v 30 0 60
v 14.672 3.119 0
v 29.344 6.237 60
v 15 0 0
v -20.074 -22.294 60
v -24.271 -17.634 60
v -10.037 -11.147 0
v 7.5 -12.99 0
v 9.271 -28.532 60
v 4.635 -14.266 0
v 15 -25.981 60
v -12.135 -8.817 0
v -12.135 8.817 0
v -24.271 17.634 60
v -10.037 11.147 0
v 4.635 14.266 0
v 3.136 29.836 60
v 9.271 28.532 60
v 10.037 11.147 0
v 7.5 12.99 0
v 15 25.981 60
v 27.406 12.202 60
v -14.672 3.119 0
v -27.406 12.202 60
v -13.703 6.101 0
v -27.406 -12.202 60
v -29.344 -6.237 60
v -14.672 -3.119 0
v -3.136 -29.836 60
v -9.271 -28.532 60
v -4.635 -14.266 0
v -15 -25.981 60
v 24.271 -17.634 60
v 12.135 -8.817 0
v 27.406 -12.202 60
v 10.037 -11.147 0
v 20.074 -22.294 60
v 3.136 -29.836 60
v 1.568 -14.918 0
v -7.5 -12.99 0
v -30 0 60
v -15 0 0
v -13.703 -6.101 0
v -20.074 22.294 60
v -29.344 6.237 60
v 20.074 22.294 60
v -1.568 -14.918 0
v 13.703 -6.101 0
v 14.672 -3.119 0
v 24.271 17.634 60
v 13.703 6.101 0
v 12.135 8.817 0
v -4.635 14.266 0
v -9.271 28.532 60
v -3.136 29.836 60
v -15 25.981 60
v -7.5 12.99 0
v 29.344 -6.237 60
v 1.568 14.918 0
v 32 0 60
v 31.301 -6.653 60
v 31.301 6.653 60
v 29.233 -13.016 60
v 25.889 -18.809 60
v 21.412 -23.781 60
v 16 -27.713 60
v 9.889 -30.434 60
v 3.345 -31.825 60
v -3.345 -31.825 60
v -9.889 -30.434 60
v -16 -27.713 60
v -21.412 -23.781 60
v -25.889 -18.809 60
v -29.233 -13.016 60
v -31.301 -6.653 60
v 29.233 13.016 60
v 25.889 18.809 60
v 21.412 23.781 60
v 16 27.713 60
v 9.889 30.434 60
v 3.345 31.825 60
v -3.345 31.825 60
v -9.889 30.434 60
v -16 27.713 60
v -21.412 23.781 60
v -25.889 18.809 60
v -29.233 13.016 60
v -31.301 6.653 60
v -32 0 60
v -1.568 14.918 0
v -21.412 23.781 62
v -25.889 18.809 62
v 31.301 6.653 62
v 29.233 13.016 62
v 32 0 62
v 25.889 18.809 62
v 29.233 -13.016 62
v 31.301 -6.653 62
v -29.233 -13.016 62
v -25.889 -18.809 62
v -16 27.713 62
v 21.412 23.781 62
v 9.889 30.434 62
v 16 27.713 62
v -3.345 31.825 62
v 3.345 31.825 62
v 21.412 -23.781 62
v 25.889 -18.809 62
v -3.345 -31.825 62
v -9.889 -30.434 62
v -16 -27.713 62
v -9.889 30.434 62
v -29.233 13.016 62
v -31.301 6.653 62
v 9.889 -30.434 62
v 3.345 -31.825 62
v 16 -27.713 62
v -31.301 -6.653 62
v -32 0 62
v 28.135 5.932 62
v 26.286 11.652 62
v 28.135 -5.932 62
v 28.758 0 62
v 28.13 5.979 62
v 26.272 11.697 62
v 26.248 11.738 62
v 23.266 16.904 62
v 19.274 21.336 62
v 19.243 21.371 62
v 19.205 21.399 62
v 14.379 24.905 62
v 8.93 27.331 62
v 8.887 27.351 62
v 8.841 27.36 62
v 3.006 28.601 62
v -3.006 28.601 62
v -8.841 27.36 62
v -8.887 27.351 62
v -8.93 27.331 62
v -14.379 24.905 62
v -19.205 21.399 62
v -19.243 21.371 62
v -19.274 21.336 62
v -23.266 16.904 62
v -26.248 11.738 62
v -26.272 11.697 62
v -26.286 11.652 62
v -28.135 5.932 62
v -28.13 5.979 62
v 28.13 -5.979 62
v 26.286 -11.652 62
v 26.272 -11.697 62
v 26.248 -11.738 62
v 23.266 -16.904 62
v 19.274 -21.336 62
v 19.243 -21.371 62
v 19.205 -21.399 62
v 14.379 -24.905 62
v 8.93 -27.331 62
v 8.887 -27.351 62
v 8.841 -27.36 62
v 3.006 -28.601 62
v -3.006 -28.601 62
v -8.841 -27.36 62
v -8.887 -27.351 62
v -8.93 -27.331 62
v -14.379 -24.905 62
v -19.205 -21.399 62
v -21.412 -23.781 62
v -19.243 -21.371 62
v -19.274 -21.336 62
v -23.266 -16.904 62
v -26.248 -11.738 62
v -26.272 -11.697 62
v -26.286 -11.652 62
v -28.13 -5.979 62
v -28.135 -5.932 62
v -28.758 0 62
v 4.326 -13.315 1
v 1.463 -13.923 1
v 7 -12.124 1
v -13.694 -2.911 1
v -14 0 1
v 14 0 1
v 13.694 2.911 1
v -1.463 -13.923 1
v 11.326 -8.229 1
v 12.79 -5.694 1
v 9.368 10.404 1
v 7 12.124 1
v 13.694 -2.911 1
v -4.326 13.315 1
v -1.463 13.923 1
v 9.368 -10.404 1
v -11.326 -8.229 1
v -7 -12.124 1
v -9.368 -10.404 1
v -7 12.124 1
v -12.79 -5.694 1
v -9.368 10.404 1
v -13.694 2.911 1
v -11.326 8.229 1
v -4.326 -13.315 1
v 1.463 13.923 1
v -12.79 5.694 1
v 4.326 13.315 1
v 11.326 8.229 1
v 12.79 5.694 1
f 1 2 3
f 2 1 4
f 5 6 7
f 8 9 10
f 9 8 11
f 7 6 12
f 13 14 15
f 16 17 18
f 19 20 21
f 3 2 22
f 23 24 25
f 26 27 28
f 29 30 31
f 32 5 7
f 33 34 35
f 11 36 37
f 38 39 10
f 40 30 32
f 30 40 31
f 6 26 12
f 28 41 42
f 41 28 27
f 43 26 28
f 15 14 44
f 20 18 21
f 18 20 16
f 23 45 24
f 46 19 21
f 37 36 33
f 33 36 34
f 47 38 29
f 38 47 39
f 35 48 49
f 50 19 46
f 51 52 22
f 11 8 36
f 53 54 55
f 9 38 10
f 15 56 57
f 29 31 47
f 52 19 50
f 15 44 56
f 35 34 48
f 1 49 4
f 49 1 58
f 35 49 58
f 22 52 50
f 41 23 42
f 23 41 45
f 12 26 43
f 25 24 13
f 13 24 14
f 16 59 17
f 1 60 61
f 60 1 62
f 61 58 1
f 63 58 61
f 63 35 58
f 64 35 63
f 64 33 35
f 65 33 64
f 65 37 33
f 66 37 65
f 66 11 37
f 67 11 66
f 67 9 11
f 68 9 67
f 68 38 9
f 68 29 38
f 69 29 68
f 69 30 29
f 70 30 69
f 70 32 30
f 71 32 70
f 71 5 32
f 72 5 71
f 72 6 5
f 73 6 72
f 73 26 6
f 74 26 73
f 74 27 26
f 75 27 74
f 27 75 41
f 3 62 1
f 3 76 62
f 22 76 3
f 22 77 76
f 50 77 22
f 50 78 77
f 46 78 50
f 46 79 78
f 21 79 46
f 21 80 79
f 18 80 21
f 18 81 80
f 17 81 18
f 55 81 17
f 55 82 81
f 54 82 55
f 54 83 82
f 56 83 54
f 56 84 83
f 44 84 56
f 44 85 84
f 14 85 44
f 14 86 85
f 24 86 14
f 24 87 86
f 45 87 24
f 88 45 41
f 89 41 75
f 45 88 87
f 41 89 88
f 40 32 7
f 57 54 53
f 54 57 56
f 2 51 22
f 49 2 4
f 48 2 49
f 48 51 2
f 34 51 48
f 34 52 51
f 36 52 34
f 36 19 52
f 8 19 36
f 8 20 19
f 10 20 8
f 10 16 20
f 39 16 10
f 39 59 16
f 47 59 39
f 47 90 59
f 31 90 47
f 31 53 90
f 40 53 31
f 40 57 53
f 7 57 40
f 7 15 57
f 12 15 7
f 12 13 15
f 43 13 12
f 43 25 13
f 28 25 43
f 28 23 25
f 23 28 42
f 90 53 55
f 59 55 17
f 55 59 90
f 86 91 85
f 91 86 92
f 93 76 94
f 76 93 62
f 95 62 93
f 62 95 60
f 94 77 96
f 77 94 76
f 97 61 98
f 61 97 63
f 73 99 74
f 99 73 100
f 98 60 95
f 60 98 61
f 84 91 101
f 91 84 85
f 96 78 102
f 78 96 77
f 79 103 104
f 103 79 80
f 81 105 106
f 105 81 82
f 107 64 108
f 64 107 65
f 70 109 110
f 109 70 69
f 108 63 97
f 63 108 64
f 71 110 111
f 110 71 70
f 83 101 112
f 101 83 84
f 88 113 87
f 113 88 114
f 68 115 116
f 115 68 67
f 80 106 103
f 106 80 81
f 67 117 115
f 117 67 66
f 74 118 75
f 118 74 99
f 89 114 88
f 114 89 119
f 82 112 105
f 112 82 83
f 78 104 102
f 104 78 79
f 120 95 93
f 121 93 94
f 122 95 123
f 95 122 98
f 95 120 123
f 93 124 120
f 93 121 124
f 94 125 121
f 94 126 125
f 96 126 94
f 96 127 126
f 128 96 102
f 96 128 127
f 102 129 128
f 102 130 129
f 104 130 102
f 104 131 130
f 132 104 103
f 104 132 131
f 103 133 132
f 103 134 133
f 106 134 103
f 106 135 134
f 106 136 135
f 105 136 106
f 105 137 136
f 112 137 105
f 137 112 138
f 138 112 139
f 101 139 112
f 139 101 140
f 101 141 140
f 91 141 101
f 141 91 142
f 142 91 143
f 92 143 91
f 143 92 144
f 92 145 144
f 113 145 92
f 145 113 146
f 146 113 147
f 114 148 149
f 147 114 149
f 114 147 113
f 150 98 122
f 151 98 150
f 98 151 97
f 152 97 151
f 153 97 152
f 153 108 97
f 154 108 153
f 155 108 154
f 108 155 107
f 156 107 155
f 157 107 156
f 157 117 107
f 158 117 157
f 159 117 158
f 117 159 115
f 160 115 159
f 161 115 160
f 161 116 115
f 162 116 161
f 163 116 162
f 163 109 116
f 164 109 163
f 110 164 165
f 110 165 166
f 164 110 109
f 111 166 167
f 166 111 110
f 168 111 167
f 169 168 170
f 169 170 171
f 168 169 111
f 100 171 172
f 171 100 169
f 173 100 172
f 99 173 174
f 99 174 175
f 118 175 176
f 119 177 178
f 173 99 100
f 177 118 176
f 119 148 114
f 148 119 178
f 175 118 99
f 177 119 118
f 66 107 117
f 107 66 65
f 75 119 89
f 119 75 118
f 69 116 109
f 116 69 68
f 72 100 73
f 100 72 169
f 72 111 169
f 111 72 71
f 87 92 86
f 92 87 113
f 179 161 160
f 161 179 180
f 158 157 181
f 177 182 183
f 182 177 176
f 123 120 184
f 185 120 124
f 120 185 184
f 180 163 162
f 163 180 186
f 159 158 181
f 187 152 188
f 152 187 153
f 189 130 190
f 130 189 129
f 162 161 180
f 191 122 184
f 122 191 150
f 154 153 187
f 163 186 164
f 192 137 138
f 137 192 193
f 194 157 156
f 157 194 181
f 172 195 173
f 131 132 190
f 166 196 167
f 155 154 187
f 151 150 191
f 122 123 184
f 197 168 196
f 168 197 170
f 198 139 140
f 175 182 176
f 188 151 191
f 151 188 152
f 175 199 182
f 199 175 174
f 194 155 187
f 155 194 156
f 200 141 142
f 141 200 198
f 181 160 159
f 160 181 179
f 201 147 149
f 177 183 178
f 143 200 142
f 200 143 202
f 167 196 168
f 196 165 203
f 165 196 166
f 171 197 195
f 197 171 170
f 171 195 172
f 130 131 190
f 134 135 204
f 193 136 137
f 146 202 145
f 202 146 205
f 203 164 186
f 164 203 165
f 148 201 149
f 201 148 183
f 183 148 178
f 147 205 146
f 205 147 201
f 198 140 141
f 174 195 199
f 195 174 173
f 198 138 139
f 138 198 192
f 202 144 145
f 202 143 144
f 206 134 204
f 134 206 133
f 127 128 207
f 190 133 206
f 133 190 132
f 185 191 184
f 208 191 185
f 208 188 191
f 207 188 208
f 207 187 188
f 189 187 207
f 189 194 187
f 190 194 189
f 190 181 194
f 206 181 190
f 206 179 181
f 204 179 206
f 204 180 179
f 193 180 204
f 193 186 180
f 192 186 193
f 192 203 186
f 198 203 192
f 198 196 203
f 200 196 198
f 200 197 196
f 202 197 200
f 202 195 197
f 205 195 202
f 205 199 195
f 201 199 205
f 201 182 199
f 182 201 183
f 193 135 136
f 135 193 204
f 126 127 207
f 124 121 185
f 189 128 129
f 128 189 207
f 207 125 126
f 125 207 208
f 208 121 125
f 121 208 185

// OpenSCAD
module pahar_plastic(inaltime_pahar, raza_baza_pahar, raza_sus_pahar, raza_buza, inaltime_buza, grosime_perete)
{
   difference(){
    union(){
    cylinder(h = inaltime_pahar, r1 = raza_baza_pahar, r2 = raza_sus_pahar);
    translate([0, 0, inaltime_pahar]) cylinder(h = inaltime_buza, r = raza_buza); 
    } 
    translate([0, 0, grosime_perete]) cylinder(h = inaltime_pahar + inaltime_buza, r1 = raza_baza_pahar - grosime_perete, r2 = raza_sus_pahar - grosime_perete);
        
    }  
}

pahar_plastic(60, 15, 30, 32, 2, 1);
